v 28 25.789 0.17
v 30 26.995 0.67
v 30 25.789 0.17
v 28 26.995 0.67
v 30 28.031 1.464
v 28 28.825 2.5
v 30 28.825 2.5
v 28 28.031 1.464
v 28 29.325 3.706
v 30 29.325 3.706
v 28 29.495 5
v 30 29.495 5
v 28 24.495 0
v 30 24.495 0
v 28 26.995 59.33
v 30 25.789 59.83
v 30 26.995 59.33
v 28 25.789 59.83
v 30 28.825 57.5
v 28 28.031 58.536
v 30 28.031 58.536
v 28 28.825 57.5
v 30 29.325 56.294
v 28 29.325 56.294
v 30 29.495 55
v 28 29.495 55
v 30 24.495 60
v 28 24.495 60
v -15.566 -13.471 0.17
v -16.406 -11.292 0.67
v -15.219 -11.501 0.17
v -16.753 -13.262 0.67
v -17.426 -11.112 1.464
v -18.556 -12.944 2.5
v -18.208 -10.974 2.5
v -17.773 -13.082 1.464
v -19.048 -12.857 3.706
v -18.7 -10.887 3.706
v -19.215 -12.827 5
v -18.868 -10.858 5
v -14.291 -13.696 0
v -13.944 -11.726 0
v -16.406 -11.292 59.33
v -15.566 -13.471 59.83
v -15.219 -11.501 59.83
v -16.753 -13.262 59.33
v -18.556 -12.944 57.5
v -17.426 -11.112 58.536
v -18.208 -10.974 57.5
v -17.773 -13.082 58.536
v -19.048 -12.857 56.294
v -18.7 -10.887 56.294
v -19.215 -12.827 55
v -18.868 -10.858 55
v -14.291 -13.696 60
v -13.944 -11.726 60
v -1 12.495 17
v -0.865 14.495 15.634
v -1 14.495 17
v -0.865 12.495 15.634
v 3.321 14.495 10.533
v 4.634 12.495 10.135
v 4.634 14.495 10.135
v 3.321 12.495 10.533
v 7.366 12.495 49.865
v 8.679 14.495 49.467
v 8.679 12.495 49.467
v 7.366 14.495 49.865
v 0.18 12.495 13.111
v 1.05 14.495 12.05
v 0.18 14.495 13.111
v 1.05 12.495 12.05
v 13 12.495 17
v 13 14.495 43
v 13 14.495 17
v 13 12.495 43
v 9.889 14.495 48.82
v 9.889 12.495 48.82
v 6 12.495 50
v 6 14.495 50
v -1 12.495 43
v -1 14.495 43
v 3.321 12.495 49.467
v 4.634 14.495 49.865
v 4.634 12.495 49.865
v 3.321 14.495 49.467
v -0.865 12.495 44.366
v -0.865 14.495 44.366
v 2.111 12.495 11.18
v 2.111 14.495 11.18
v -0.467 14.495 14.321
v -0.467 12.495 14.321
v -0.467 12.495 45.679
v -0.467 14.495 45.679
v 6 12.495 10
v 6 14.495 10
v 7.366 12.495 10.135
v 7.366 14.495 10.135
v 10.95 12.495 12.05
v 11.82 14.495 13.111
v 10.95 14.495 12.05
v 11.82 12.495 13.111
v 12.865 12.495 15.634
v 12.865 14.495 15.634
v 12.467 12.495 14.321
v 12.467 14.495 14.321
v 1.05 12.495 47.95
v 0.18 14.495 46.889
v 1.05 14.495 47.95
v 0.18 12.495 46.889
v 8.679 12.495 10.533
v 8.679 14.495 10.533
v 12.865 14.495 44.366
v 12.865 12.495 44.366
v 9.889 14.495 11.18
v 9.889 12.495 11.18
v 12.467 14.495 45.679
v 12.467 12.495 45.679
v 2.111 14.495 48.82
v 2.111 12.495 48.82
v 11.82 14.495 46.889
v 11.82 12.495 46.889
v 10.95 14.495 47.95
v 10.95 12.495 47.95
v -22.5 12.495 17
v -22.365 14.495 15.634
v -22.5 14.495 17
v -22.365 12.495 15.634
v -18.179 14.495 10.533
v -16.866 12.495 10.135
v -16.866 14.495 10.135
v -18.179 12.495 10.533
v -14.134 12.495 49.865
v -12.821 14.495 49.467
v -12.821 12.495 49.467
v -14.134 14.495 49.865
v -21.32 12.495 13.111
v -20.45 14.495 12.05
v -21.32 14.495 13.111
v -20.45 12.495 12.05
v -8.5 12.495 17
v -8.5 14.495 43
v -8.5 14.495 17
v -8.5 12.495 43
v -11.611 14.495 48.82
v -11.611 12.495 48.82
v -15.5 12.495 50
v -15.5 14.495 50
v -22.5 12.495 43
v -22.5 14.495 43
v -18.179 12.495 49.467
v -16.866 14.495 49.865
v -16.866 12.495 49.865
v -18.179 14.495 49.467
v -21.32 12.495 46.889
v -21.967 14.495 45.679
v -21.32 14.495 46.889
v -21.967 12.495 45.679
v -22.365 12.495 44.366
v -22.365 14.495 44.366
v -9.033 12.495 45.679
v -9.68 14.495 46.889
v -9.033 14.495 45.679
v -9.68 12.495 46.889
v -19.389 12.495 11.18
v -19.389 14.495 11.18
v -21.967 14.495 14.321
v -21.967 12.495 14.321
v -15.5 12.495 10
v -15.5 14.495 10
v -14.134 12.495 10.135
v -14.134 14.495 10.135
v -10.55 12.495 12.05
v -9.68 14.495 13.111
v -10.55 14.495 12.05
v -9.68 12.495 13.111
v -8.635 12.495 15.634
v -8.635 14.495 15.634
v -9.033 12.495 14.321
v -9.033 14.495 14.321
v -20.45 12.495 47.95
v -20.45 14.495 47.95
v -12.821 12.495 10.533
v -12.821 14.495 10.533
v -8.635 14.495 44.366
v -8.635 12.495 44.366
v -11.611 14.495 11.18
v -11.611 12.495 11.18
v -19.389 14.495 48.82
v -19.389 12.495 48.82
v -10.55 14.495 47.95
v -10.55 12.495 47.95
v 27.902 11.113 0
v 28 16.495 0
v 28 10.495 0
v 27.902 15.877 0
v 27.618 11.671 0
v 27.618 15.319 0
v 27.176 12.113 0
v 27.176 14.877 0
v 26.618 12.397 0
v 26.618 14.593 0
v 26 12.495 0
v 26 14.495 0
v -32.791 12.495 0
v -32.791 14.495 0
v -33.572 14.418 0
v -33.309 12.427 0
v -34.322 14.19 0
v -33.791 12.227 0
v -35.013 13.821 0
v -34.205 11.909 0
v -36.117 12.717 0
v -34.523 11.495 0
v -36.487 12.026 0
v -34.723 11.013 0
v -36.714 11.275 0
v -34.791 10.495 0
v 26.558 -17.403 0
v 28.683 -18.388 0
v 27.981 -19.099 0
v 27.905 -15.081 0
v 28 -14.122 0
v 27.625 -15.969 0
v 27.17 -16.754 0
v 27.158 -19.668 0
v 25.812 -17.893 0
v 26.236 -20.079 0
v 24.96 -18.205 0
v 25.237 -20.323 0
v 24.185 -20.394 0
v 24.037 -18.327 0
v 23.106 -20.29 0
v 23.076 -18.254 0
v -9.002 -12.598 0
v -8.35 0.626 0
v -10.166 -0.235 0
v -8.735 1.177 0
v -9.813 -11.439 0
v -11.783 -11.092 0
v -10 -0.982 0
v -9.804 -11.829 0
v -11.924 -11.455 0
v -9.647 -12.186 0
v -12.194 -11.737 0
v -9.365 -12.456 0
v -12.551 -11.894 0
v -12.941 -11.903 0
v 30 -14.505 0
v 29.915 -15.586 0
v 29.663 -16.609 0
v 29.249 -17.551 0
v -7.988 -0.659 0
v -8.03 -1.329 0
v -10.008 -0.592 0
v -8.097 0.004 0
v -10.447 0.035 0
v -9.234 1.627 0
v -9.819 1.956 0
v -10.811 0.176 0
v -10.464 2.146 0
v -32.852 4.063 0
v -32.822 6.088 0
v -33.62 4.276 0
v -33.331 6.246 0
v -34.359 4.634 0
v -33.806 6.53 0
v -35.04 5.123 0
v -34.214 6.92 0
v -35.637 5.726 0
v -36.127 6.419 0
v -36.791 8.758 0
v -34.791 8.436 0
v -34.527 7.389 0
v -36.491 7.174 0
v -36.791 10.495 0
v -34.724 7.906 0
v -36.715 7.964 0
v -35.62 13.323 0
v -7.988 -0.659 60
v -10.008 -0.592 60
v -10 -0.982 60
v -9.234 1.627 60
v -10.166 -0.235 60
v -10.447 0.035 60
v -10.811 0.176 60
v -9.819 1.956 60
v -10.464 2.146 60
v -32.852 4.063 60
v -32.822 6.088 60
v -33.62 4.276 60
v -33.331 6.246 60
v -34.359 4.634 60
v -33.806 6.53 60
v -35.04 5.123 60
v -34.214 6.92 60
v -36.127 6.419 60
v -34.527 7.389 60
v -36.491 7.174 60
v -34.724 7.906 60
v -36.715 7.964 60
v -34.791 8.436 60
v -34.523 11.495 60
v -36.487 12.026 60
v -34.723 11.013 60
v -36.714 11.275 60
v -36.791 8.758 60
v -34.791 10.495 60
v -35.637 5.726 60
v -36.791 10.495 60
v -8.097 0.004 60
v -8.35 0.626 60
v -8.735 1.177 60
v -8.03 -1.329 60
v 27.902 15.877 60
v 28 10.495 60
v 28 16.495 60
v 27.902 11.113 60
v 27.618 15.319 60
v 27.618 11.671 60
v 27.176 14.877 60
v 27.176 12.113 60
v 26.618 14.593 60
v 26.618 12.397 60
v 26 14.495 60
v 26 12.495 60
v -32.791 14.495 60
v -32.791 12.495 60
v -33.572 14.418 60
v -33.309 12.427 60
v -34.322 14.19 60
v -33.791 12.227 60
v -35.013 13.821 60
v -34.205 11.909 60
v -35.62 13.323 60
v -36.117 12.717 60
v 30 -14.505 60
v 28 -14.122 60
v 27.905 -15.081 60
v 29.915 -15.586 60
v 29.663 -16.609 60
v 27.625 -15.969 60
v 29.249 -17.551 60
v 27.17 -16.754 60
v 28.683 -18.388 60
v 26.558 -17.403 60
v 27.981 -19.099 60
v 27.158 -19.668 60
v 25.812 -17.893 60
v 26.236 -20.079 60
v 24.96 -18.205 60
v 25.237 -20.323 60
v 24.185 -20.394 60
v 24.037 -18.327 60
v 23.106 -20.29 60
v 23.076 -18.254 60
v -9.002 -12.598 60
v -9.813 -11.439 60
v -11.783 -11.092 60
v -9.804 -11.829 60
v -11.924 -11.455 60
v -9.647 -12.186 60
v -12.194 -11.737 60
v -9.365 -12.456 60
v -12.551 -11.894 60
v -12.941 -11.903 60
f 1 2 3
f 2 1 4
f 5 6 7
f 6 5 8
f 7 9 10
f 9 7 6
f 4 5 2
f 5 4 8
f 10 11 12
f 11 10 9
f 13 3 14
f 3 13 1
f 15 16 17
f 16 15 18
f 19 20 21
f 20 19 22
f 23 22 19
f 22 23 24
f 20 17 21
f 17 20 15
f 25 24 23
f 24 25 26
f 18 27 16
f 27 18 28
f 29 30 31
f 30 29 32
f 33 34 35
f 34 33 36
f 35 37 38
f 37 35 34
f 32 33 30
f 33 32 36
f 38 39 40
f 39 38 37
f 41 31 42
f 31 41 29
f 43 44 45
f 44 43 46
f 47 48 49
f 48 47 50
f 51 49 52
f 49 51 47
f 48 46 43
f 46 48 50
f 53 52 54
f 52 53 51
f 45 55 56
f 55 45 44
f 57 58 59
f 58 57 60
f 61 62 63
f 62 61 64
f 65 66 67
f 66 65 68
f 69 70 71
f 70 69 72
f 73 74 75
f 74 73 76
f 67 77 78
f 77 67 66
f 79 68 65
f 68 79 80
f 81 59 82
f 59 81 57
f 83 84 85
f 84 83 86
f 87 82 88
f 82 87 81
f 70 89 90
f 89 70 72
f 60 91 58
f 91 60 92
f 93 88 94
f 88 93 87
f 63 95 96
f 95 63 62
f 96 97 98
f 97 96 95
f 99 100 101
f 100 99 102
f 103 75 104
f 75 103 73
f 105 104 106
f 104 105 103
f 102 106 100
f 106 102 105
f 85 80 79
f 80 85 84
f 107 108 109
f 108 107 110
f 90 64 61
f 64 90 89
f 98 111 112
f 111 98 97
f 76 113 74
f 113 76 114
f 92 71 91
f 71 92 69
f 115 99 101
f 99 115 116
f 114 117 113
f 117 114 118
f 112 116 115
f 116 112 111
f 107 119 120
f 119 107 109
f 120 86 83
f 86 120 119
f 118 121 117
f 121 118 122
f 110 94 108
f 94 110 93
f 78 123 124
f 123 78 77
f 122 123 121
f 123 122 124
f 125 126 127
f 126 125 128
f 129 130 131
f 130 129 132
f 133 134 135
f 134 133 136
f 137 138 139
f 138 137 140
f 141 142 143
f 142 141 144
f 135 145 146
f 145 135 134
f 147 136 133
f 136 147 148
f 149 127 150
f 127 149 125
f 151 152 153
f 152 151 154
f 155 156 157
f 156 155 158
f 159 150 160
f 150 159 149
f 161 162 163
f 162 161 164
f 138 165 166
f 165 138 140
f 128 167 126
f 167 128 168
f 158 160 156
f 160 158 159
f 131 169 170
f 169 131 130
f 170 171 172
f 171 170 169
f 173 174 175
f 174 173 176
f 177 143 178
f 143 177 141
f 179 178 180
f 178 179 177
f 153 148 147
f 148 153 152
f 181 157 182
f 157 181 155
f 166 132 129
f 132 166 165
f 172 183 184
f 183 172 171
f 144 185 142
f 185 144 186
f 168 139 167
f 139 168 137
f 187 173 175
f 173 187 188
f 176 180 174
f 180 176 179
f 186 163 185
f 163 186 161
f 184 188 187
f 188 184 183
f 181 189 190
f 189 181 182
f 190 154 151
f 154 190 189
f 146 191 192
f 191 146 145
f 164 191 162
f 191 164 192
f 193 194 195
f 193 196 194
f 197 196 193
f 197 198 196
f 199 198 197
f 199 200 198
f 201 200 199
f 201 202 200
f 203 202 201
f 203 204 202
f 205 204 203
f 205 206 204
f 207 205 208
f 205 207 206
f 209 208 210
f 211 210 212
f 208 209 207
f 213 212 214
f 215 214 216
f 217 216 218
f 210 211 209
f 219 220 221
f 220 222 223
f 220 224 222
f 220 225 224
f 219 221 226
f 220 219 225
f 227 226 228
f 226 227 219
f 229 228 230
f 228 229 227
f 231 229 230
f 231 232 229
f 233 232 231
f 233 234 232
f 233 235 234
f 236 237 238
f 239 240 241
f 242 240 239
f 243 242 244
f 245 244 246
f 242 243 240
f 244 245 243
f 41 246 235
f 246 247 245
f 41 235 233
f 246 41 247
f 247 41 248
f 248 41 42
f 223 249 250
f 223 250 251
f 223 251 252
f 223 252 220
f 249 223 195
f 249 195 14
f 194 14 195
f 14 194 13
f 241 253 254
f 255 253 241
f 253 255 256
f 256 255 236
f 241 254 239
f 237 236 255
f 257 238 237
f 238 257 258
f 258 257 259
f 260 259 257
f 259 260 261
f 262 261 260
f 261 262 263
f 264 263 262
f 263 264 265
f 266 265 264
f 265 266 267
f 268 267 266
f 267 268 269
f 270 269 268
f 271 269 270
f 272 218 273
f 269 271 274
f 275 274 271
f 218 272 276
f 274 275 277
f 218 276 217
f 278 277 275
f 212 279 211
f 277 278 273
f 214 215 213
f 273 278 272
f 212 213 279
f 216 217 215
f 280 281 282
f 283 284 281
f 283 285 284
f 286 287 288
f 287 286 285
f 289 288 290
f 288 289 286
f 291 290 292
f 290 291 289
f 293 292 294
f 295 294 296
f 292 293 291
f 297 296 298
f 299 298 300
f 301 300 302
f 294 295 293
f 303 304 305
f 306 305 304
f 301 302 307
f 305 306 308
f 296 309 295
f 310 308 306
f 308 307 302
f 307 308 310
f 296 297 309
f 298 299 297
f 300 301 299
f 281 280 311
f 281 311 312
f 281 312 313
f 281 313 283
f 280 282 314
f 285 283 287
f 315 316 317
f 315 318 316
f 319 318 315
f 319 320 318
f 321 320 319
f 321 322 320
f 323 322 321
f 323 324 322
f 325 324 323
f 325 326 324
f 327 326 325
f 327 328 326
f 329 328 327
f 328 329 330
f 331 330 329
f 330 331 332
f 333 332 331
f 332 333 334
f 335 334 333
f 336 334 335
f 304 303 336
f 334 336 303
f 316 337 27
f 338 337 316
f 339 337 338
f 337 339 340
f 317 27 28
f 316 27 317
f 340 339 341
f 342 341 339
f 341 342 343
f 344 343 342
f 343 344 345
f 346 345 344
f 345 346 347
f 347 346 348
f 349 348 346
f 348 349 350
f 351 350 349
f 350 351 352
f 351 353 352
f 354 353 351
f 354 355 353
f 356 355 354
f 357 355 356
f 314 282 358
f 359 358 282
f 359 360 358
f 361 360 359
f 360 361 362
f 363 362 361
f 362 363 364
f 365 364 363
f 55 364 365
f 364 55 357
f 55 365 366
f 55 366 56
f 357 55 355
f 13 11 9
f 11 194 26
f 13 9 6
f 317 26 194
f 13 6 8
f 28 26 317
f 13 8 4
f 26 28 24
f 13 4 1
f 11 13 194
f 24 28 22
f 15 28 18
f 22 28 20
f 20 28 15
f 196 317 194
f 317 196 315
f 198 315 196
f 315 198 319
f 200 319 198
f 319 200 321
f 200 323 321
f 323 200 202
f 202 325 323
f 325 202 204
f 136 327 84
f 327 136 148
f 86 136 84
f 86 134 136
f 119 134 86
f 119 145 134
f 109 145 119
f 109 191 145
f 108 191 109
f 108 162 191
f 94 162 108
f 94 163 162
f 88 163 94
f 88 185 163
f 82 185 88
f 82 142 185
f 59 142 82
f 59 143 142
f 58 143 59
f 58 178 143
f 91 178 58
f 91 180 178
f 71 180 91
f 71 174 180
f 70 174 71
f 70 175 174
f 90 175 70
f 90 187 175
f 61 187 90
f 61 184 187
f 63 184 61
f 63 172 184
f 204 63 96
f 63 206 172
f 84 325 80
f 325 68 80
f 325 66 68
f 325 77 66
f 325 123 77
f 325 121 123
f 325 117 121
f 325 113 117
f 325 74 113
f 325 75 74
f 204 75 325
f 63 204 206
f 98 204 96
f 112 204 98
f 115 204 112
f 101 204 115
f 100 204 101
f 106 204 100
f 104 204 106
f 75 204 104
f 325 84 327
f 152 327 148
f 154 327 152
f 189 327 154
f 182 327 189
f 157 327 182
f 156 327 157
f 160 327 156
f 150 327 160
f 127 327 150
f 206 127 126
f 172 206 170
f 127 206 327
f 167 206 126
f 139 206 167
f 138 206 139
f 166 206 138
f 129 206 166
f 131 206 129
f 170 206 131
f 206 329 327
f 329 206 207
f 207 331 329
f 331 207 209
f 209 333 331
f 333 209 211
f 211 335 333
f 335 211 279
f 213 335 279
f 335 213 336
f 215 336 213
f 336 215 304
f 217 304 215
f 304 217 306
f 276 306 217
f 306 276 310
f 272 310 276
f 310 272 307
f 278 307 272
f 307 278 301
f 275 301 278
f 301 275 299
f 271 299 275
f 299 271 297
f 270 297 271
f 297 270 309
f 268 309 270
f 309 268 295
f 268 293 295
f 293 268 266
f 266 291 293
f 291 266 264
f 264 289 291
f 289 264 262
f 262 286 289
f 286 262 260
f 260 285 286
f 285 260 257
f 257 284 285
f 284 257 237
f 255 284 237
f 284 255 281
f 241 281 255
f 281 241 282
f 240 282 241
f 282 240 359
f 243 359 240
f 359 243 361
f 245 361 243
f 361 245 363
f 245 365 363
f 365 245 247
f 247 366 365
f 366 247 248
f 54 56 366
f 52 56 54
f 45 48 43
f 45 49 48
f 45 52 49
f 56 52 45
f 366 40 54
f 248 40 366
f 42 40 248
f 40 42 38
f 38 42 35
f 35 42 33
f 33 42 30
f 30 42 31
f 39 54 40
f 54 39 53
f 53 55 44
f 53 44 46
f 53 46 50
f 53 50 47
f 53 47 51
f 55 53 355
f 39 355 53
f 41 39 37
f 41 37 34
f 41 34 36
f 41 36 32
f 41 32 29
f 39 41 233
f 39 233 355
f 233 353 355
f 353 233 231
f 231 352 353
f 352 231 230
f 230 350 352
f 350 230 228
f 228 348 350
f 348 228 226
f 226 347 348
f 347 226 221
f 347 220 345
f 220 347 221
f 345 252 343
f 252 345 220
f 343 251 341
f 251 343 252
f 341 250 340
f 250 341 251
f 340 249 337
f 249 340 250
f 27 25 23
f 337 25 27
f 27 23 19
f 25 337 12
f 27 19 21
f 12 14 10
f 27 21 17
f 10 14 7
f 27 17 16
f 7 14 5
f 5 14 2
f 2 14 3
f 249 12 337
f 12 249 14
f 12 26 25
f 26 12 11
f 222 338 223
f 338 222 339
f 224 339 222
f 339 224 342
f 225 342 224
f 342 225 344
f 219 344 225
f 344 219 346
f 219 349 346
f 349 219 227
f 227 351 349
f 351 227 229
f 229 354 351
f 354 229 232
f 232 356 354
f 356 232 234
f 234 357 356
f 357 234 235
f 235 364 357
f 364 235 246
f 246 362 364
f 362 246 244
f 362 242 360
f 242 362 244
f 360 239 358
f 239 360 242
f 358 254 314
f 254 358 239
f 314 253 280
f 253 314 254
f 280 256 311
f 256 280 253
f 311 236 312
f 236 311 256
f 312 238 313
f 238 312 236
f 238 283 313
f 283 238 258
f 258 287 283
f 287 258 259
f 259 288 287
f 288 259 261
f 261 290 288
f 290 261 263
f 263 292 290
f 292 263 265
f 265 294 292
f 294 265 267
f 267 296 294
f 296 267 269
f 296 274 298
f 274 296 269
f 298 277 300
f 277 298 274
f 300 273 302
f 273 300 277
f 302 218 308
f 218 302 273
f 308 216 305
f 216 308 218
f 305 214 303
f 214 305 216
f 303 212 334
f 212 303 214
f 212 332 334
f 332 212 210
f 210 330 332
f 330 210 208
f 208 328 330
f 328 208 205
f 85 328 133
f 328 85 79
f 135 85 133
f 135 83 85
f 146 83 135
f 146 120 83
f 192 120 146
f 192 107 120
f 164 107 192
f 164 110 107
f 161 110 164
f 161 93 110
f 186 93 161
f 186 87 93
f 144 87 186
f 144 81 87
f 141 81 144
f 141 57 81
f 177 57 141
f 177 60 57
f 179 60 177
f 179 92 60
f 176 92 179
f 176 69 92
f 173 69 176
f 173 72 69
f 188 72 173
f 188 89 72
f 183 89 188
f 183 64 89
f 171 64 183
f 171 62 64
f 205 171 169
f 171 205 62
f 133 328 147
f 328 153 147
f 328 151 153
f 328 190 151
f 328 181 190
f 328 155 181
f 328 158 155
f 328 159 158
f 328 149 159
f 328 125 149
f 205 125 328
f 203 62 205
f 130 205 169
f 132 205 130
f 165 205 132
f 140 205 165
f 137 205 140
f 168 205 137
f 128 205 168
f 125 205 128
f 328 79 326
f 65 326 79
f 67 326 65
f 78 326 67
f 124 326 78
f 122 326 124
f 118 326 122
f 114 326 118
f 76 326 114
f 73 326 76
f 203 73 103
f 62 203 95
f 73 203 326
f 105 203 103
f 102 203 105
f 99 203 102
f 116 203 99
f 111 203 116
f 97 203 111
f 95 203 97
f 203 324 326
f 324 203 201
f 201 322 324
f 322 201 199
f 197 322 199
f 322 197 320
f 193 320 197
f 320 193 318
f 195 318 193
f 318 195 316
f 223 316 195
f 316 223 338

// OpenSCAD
// Smartphone Stand by DrLex, 2018/04 - 2019/07
// Released under Creative Commons - Attribution license

// Thickness of your phone. Depending on the shape, you may need to add some extra margin.
thick = 12.0; //[3.0:0.1:25.0]
// How high to raise the phone from the surface. This should be high enough if you want to be able to plug in a USB cable.
lift = 40; //[10.0:0.5:60.0]
// Width of the holder.
width = 60.0; //[5:0.5:100.0]
// Length of the lip at the rear.
rearLip = 15; //[5:0.5:60]
// Enable slots in the rear (to reduce material, route cables, or just for the looks). Only if width is at least 34.
rearSlots = "yes"; //[yes,no]
// Omit the rear lip entirely to allow mounting to a wall.
wallMount = "no"; //[yes,no]
// Create a hole for a USB cable. Cannot be used if thick < 9.
usbHole = "no"; //[yes,no]
// Create a cable hole in the bottom front.
frontHole = "no"; //[yes,no]
// Create a cable hole in the bottom rear.
rearHole = "no"; //[yes,no]
// Create a gap in the front for easier cable routing (overrides frontHole and usbHole, requires thick ≥ 9). A support will be included that must be broken away after printing. Some sanding may be needed for a nice result.
frontGap = "no"; //[yes,no]

// Enable this and set width to 5 to print a quick test slice to see whether your phone fits well. (Rounded corners and holes will be omitted.)
testPiece = "no"; //[yes,no]

// Show the model in its normal use orientation without any built-in supports. On an FDM printer you probably shouldn't try to print it like this.
preview = "no"; //[yes,no]

/* [Advanced] */
// When using frontGap, leave this much of a gap between the built-in support and the actual object.
suppGap = 0.2; //[0.1:0.01:0.4]


/* [Hidden] */
// Unlike the OpenSCAD customizer, the Thingiverse customizer does not support simple checkboxes, hence this kludge.
bRearSlots = (rearSlots == "yes");
bWallMount = (wallMount == "yes");
bUsbHole   = (usbHole == "yes" || frontGap == "yes") && thick >= 8.8;
bFrontHole = (frontHole == "yes");
bRearHole  = (rearHole == "yes");
bFrontGap  = (frontGap == "yes" && thick >= 8.8);
bTestPiece = (testPiece == "yes");
bPreview   = (preview == "yes");

rear = rearLip + 14.495;
ox = thick * cos(10);
ox2 = ox + (thick * sin(10) + lift - 38.2967) * tan(10);
lift2 = lift + thick * sin(10);

rearSlot1 = lift < 30 || lift >= 53 ? lift/2 + 14 : lift/2 + 4;
rearSlot2 = lift >= 30 ? rearSlot1 + 21.5 : 0.0;
rearSlot3 = lift >= 53 ? rearSlot1 - 21.5 : 0.0;

rotation = bPreview ? [90, 0, 90] : [0, 0, 90];
shift = bPreview ? [-width/2, 0, 0] : [lift/2 + 10, 0, 0];

translate(shift) rotate(rotation) difference() {
    linear_extrude(width, convexity=10) extrusionProfile();

    if(! bTestPiece) {
        translate([rear, 0, 0]) rotate([90, 0, 0]) cornerCutter();
        translate([rear, 0, width]) rotate([-90, 0, 0]) cornerCutter();
        translate([-1.00976 - ox, 7.13165 + lift2, 0]) rotate([90, 0, 80]) cornerCutter();
        translate([-1.00976 - ox, 7.13165 + lift2, width]) rotate([-90, 0, 80]) cornerCutter();

        if(bRearSlots && width >= 34) {
            translate([13.495, rearSlot1, width/2]) rotate([0, 90, 0]) stretchCylinder(7, width - 20, 5);
            if(rearSlot2 > 0)
                translate([13.495, rearSlot2, width/2]) rotate([0, 90, 0]) stretchCylinder(7, width - 20, 5);
            if(rearSlot3 > 0)
                translate([13.495, rearSlot3, width/2]) rotate([0, 90, 0]) stretchCylinder(7, width - 20, 5);
        }

        if(bUsbHole && thick >= 8.8) {
            translate([(-0.982058 + 0.725908 - ox)/2, (lift - 0.30121 + lift2)/2, width/2]) rotate([100,90,0]) smoothCube(14.8, 9, 5);
        }

        // Extra fanciness has been added to reduce the need for supports. You still need good cooling and print at thin layers to avoid making a mess, though. Or, simply cut away the mess after printing.
        if(bFrontGap) {
            translate([-ox2, 0, width/2]) {
                difference() {
                    translate([-9, -0.49, 0]) rotate([90, 0, 0]) stretchCylinder(7.4, 30, 5);
                    translate([-28, -4, -8]) cube([25, 7, 16]);
                }
                if(bPreview) {
                    translate([-10, -2, -7.4]) rotate([0,0,-10]) cube([7.6, lift+20, 14.8]);
                    translate([0, lift-2, -7.4]) rotate([0,0,-10]) cube([thick/2, 20, 14.8]);
                }
                else {
                    translate([-10, -2, 7.4-suppGap]) rotate([0,0,-10]) cube([7.6, lift+20, suppGap]);
                    translate([0, lift-2, 7.4-suppGap]) rotate([0,0,-10]) cube([thick/2, 20, suppGap]);
                    translate([-10, -2, -7.4]) rotate([0,0,-10]) cube([7.6, lift+20, suppGap]);
                    translate([0, lift-2, -7.4]) rotate([0,0,-10]) cube([thick/2, 20, suppGap]);
                    // Do not waste material in support, thinner also makes it easier to remove
                    translate([-9.5, 0, 0]) rotate([90,0,-9.95]) translate([0, 0, -lift/2-7]) smoothCube(3, 12, lift+20);
                }
                translate([-2.5, 0, 0]) cube([2.0, 10, 14.8], center=true);
            }
        }
        else if(bFrontHole) {
            translate([-ox2, 0, width/2]) {
                translate([-9, -0.49, 0]) rotate([90, 0, 0]) stretchCylinder(7.4, 30, 5);
                translate([-10, 0, 0]) rotate([90, 0, 90]) stretchCylinder(7, 21, 17);
                translate([-3.3, 0, 0]) cube([3.6, 10, 14.8], center=true);
            }
        }

        if(bRearHole) {
            difference() {
                translate([13.495, -0.49, width/2]) rotate([90, 0, 0]) stretchCylinder(7.4, 22, 5);
                translate([13.495, 0, width/2-7.4]) cube([2.0, 10, .8], center=true);
                translate([13.495, 0, width/2+7.4]) cube([2.0, 10, .8], center=true);
            }
            translate([13.495, 0, width/2]) rotate([90, 0, 90]) stretchCylinder(7, 21, 8);
            translate([11.495, 0, width/2]) cube([2, 10, 14.8], center=true);
            translate([15.495, 0, width/2]) cube([2, 10, 14.8], center=true);
        }

//        if(bFrontHole) {
//            translate([-ox - 10, 1, width/2]) rotate([90, 0, 0]) stretchSphere(7, 30, 5);
//        }
//        
//        if(bRearHole) {
//             translate([13.495, 1, width/2]) rotate([90, 0, 0]) stretchSphere(7, 22, 5);
//        }

        if(bWallMount) {
            translate([14.495, -5, -5]) cube([rearLip+1, 12, width+10]);
        }
    }
}


module cornerCutter() {
    difference() {
        cube([10, 10, 5], center=true);
        translate([-5, 5, 0]) cylinder(r=5, h=6, $fn=24, center=true);
    }
}

module smoothCube(w, d, ht) {
    minkowski() {
        cube([w-2, d-2, ht-1], center=true);
        cylinder(r=1, h=1, $fn=20);
    }
}

module stretchCylinder(r, l, h) {
    hull() {
        translate([-l/2+r, 0, 0]) cylinder(r=r, h=h, center=true, $fn=32);
        translate([l/2-r, 0, 0]) cylinder(r=r, h=h, center=true, $fn=32);
    }
}

module stretchSphere(r, l, h) {
    hull() {
        translate([-l/2+r, 0, h/2]) sphere(r=r, center=true, $fn=32);
        translate([l/2-r, 0, h/2]) sphere(r=r, center=true, $fn=32);        
        translate([-l/2+r, 0, -h/2]) sphere(r=r, center=true, $fn=32);
        translate([l/2-r, 0, -h/2]) sphere(r=r, center=true, $fn=32);        
    }
}

// These coordinates were extracted from a prototype model created in Blender.
// In retrospect I might have used a single line instead, and add thickness to it with offset(). However, I'm not sure how easy it would be to add the various rounded corners.
module extrusionProfile() {
    polygon(points = [
        [rear, 0], // rear T-joint outer (0)
        [rear, 2],
        [16.495, 2],
        [15.877, 2.09789],
        [15.3195, 2.38197],
        [14.877, 2.82443],
        [14.5929, 3.38197],
        [14.495, 4],
        [12.495, 4], // rear T-joint inner (8)
        [12.3971, 3.38197],
        [12.1131, 2.82443],
        [11.6706, 2.38197],
        [11.1131, 2.09789],
        [10.495, 2],
        [14.495, 22.7912 + lift], // top arc outer (14)
        [14.4182, 23.5716 + lift],
        [14.1905, 24.322 + lift],
        [13.8209, 25.0135 + lift],
        [13.3234, 25.6196 + lift],
        [12.7173, 26.1171 + lift],
        [12.0258, 26.4867 + lift],
        [11.2754, 26.7144 + lift],
        [10.495, 26.7912 + lift],
        [8.758, 26.7912 + lift],
        [7.96429, 26.7155 + lift],
        [7.17439, 26.4914 + lift],
        [6.41864, 26.1273 + lift],
        [5.72611, 25.6374 + lift],
        [5.12338, 25.0405 + lift],
        [4.63365, 24.3595 + lift],
        [4.27570, 23.6205 + lift],
        [4.06332, 22.852 + lift],
        [6.08829, 22.8216 + lift], // top arc inner (32)
        [6.24633, 23.3314 + lift],
        [6.52989, 23.8064 + lift],
        [6.91965, 24.2143 + lift],
        [7.38906, 24.5273 + lift],
        [7.90612, 24.7241 + lift],
        [8.43559, 24.7912 + lift],
        [10.495, 24.7912 + lift],
        [11.0127, 24.7231 + lift],
        [11.495, 24.5233 + lift],
        [11.9092, 24.2054 + lift],
        [12.2271, 23.7912 + lift],
        [12.4269, 23.3089 + lift],
        [12.495, 22.7912 + lift],
        [0.176419, 0.811108 + lift], // cradle rear outer (46)
        [0.034995, 0.447456 + lift],
        [-0.234827, 0.165604 + lift],
        [-0.591969, 0.008461 + lift],
        [-0.982058, lift],
        [-1.32935, -1.96966 + lift], // cradle rear inner (51)
        [-0.658872, -2.01151 + lift],
        [0.0041122, -1.90311 + lift],
        [0.626352, -1.6499 + lift],
        [1.17665, -1.26458 + lift],
        [1.62741, -0.766468 + lift],
        [1.95602, -0.180542 + lift],
        [2.14601, 0.463818 + lift],
        [0.725908 - ox, -0.30121 + lift2], // cradle front (59)
        [0.362259 - ox, -0.159795 + lift2],
        [0.080406 - ox, 0.110022 + lift2],
        [-0.076738 - ox, 0.467158 + lift2],
        [-0.085251 - ox, 0.857245 + lift2],
        [0.959858 - ox, 6.78435 + lift2],
        [-1.00976 - ox, 7.13165 + lift2],
        [-0.779844 - ox, -3.08198 + lift2], // cradle T-joint inner (66)
        [-0.638426 - ox, -2.71833 + lift2],
        [-0.368612 - ox, -2.43648 + lift2],
        [-0.011475 - ox, -2.27934 + lift2],
        [0.378613 - ox, -2.27083 + lift2],
        [-7.80451 - ox2, 6.89365], // front outer (71)
        [-7.90847 - ox2, 5.81525],
        [-7.83752 - ox2, 4.7634],
        [-7.59339 - ox2, 3.764],
        [-7.1821 - ox2, 2.84167],
        [-6.61377 - ox2, 2.0191],
        [-5.90239 - ox2, 1.31657],
        [-5.06549 - ox2, 0.751364],
        [-4.12367 - ox2, 0.3374],
        [-3.10012 - ox2, 0.084871],
        [-2.02004 - ox2, 0],
        [-1.63654 - ox2, 2], // front inner (82)
        [-2.59531 - ox2, 2.09461],
        [-3.48387 - ox2, 2.37482],
        [-4.26807 - ox2, 2.82985],
        [-4.91777 - ox2, 3.44222],
        [-5.40802 - ox2, 4.18839],
        [-5.71996 - ox2, 5.03969],
        [-5.84161 - ox2, 5.96341],
        [-5.7683 - ox2, 6.92404] // (90)
    ], paths = [
        [0, 1, 2, 3, 4, 5, 6, 7, // rear T-joint outer
        14, 15, 16, 17, 18, 19, 20, 21, 22, 23, 24, 25, 26, 27, 28, 29, 30, 31, // top arc outer
        46, 47, 48, 49, 50, // cradle rear outer
        59, 60, 61, 62, 63, 64, 65, // cradle front
        71, 72, 73, 74, 75, 76, 77, 78, 79, 80, 81, // front outer
        0], // close outer loop
        [8, 9, 10, 11, 12, 13, // rear T-joint inner
        82, 83, 84, 85, 86, 87, 88, 89, 90, // front inner
        66, 67, 68, 69, 70, // cradle T-joint inner
        51, 52, 53, 54, 55, 56, 57, 58, // cradle rear inner
        32, 33, 34, 35, 36, 37, 38, 39, 40, 41, 42, 43, 44, 45, // top arc inner
        8]
        ]);
}
